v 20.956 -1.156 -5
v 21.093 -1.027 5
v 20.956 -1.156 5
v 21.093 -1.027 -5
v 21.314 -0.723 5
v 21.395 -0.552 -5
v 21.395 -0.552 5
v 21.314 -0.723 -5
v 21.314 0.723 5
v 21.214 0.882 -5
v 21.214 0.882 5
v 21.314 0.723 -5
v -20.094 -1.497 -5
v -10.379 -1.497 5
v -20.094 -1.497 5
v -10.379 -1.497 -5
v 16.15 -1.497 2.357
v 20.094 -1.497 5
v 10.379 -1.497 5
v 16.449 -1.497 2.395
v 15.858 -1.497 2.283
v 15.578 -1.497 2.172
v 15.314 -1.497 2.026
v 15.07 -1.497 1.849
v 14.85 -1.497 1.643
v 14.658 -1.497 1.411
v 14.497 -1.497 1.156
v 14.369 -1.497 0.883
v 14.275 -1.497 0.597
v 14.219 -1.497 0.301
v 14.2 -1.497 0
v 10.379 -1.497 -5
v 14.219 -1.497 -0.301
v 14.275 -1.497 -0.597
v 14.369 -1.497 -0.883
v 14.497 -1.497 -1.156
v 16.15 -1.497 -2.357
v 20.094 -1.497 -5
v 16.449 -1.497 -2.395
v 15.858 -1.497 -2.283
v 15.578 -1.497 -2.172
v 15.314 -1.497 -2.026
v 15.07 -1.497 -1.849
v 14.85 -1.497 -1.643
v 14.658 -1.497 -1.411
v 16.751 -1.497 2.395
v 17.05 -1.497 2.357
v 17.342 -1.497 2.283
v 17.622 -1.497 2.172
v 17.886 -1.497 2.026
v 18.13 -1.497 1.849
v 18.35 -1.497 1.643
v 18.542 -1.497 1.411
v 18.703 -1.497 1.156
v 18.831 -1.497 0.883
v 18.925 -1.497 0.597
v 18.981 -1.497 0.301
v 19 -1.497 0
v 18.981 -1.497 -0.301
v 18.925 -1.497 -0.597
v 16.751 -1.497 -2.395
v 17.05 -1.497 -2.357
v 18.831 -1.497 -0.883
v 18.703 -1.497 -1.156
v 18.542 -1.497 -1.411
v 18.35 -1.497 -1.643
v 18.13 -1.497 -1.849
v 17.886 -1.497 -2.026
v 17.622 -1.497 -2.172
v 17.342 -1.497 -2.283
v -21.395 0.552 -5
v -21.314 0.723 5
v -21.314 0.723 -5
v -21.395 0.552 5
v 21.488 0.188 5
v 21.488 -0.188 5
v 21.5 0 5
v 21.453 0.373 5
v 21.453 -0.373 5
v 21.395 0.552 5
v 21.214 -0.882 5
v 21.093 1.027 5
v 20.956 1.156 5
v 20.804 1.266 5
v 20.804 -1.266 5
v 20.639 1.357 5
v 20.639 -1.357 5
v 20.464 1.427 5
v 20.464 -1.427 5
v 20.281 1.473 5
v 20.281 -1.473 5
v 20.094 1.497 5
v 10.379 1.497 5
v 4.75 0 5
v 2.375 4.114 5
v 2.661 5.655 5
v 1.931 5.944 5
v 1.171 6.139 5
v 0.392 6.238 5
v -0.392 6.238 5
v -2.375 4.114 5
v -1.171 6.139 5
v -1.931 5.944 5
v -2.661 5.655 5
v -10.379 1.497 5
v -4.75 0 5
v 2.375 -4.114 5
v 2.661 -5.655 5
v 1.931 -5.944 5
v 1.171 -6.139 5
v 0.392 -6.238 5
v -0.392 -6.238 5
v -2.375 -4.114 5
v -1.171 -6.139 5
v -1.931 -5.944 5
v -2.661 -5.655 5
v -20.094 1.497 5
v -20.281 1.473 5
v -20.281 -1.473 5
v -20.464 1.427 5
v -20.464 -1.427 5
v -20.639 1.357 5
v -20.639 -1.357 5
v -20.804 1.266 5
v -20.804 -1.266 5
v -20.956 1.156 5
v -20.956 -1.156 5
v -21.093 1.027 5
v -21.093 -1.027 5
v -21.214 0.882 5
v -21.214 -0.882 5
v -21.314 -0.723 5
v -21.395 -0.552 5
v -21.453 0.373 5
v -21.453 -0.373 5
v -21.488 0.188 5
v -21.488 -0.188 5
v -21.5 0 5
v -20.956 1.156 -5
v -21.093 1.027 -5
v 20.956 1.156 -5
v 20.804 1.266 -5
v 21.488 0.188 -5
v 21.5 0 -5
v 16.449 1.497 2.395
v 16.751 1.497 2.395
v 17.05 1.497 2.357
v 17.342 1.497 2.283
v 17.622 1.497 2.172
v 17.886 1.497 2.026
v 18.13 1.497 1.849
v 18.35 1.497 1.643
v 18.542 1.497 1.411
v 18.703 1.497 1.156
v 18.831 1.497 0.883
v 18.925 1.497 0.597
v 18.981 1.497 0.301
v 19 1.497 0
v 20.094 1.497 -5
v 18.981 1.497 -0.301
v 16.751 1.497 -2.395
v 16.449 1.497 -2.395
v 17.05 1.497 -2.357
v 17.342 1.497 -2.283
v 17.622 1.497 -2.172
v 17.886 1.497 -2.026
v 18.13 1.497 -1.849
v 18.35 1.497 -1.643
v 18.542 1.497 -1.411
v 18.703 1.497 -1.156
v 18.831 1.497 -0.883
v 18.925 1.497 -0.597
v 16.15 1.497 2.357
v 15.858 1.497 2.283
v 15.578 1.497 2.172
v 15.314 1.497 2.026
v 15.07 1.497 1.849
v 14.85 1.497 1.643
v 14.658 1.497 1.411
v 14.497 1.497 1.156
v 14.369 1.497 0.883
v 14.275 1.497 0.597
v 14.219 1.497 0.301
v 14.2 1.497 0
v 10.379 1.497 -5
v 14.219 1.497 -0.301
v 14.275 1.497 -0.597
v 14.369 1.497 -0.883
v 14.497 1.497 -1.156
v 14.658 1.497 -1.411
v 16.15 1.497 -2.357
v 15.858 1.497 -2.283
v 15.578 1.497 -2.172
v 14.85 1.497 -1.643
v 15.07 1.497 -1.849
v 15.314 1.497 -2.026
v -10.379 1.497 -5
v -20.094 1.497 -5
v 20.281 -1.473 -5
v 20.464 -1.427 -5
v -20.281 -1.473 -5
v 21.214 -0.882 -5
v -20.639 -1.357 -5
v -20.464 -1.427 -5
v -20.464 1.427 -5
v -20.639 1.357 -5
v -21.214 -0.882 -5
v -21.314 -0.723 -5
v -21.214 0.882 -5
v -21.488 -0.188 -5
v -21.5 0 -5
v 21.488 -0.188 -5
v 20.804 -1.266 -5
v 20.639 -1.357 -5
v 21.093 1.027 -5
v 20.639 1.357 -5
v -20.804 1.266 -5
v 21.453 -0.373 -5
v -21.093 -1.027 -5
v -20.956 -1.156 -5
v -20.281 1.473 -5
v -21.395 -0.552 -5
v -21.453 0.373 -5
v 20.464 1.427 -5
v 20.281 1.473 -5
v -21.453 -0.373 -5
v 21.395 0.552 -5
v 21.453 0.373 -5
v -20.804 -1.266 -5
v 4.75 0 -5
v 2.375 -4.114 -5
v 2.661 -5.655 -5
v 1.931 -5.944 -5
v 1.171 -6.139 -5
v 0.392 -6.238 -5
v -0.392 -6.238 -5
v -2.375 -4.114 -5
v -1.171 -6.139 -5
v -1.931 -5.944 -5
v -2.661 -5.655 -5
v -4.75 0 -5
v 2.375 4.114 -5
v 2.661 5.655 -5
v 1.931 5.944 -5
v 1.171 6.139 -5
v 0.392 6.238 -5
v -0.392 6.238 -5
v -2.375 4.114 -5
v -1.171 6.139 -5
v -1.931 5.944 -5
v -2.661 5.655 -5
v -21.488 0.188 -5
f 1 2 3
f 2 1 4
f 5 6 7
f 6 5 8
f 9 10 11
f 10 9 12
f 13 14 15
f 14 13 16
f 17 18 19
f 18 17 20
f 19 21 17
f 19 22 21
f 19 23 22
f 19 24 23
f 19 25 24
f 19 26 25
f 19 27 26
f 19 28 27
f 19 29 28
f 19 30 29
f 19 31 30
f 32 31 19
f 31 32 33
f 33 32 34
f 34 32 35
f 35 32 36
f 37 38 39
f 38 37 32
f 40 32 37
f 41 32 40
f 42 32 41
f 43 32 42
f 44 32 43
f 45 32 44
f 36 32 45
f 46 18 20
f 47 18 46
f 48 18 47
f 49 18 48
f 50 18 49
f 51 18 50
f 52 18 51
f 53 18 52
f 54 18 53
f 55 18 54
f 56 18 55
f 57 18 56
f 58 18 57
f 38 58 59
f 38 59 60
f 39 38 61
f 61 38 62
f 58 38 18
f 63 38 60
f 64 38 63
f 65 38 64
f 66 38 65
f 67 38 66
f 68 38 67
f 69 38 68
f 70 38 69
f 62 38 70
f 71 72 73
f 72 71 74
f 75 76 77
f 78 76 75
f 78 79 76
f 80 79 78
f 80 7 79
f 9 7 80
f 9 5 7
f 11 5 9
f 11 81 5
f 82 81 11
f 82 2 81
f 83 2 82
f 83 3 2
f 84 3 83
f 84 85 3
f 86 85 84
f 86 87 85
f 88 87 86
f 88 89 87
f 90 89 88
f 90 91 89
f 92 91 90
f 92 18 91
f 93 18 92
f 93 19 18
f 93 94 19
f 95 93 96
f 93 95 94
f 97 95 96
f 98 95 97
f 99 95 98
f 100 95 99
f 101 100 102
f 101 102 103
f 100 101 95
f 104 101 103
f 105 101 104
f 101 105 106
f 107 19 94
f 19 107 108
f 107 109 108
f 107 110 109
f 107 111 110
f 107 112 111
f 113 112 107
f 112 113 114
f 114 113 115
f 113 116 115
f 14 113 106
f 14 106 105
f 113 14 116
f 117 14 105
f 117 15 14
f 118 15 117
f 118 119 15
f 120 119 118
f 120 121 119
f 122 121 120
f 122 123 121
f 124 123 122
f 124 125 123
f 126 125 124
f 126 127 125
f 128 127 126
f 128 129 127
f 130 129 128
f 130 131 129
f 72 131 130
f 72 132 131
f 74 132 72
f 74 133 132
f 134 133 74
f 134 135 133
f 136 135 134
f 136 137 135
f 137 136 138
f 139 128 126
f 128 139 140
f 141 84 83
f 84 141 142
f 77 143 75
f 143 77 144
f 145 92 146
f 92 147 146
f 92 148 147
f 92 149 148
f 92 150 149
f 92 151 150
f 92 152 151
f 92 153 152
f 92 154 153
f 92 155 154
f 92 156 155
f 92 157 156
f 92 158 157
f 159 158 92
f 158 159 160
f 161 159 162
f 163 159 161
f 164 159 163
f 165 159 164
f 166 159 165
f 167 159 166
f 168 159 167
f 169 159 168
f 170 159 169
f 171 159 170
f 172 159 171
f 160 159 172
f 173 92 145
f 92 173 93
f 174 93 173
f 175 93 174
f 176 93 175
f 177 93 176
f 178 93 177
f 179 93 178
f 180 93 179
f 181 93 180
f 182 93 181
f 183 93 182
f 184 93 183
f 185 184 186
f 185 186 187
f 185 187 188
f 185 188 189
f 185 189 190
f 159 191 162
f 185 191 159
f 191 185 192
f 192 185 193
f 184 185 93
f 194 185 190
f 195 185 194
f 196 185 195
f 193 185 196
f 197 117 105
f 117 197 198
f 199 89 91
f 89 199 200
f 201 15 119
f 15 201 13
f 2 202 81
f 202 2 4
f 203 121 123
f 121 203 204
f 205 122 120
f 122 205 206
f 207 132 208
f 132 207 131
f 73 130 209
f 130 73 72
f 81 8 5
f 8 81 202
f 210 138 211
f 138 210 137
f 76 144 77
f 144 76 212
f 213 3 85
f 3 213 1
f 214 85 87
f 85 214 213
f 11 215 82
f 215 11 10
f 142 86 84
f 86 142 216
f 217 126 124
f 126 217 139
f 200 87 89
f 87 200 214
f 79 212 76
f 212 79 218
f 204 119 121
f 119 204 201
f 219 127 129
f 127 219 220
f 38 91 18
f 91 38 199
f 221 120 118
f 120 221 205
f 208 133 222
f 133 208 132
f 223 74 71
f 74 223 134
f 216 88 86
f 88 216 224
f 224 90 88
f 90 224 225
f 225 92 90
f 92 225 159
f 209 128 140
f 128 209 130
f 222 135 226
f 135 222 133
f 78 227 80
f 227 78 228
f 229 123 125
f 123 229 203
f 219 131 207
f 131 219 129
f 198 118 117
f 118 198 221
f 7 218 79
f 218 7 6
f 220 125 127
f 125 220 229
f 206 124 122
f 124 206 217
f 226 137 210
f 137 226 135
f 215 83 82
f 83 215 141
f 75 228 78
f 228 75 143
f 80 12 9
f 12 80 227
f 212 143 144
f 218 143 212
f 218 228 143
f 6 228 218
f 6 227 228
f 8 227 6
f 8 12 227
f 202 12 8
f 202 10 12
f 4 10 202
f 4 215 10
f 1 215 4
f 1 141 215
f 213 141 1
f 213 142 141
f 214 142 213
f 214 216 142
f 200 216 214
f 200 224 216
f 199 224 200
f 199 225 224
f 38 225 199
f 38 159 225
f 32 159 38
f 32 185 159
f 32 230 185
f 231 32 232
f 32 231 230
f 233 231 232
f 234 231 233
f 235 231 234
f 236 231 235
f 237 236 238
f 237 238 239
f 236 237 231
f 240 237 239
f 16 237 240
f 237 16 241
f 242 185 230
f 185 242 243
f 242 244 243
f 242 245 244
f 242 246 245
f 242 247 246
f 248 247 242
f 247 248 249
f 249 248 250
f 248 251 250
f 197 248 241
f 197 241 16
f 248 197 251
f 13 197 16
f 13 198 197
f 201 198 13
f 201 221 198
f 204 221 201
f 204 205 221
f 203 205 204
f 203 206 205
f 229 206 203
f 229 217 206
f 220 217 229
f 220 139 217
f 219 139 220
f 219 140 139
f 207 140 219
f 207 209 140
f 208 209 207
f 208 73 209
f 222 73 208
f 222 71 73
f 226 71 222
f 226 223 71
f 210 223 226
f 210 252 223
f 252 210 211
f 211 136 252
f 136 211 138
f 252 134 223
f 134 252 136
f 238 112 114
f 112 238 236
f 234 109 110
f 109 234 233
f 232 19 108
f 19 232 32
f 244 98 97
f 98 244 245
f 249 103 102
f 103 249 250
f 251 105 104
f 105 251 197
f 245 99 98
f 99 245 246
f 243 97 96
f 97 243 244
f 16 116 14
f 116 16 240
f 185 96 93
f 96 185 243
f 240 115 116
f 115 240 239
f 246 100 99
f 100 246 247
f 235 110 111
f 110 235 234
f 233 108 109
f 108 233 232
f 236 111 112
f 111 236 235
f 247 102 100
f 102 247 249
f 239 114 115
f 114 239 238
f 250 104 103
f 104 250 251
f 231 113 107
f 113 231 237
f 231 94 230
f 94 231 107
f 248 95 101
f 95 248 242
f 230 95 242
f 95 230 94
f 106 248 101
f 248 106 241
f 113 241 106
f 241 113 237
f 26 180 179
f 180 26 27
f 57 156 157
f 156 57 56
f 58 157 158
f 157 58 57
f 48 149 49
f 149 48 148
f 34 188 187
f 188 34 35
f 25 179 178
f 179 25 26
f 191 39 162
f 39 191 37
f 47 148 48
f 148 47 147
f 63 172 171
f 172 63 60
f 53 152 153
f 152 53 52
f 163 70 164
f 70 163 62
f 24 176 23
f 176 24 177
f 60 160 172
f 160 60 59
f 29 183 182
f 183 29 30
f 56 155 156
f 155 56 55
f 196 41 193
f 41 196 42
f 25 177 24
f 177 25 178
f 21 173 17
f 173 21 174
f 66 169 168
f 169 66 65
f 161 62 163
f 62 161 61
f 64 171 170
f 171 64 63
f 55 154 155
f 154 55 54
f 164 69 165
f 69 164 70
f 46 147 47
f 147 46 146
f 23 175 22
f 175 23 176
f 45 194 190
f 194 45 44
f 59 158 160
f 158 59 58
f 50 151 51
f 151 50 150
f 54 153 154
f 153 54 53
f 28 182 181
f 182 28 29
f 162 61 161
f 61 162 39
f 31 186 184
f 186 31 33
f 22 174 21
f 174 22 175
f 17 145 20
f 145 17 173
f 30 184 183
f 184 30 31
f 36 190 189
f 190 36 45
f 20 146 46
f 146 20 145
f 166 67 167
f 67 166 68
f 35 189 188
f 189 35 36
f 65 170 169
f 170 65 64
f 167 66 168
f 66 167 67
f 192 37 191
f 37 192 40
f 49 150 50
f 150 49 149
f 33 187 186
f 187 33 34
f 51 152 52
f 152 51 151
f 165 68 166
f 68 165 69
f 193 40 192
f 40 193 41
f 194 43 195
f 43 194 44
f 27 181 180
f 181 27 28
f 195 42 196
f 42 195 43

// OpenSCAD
// Hole diameter (bottom)
bottomHole = 9.5;
// Hole diameter (top, this should be the bigger one)
topHole = 9.5;
// Height of the tool
height = 10;
// Thickness of the handle
thickness = 3;
// Length of the handle on each side
length = 20;
// Thickness of the walls
walls = 3;
// Diameter of the keychain hole
keyhole = 4.8;

/* [Hidden] */
$fn = 50;

difference() {
  group() {
    hull() {
      translate([-length, 0, 0])
        cylinder(r = thickness /2, h = height, center = true);
        
      translate([length, 0, 0])
        cylinder(r = thickness /2, h = height, center = true);
    }

    hull() {
      cylinder(r = (topHole + walls) / 2, h = height, center = true);
      
      translate([-length / 2, 0, 0])
        cylinder(r = thickness /2, h = height, center = true);
        
      translate([length / 2, 0, 0])
        cylinder(r = thickness /2, h = height, center = true);
    }
  }
  
  cylinder(r = bottomHole / 2, h = height + 2, center = true, $fn=6);
  
  translate([0, 0, height/2])
    cylinder(r = topHole / 2, h = height + 2, center = true, $fn=6);
  
  translate([length - keyhole / 2 - 1, 0, 0])
  rotate([90, 0, 0])
    cylinder(r = keyhole / 2, h = height + 2, center = true);
}
